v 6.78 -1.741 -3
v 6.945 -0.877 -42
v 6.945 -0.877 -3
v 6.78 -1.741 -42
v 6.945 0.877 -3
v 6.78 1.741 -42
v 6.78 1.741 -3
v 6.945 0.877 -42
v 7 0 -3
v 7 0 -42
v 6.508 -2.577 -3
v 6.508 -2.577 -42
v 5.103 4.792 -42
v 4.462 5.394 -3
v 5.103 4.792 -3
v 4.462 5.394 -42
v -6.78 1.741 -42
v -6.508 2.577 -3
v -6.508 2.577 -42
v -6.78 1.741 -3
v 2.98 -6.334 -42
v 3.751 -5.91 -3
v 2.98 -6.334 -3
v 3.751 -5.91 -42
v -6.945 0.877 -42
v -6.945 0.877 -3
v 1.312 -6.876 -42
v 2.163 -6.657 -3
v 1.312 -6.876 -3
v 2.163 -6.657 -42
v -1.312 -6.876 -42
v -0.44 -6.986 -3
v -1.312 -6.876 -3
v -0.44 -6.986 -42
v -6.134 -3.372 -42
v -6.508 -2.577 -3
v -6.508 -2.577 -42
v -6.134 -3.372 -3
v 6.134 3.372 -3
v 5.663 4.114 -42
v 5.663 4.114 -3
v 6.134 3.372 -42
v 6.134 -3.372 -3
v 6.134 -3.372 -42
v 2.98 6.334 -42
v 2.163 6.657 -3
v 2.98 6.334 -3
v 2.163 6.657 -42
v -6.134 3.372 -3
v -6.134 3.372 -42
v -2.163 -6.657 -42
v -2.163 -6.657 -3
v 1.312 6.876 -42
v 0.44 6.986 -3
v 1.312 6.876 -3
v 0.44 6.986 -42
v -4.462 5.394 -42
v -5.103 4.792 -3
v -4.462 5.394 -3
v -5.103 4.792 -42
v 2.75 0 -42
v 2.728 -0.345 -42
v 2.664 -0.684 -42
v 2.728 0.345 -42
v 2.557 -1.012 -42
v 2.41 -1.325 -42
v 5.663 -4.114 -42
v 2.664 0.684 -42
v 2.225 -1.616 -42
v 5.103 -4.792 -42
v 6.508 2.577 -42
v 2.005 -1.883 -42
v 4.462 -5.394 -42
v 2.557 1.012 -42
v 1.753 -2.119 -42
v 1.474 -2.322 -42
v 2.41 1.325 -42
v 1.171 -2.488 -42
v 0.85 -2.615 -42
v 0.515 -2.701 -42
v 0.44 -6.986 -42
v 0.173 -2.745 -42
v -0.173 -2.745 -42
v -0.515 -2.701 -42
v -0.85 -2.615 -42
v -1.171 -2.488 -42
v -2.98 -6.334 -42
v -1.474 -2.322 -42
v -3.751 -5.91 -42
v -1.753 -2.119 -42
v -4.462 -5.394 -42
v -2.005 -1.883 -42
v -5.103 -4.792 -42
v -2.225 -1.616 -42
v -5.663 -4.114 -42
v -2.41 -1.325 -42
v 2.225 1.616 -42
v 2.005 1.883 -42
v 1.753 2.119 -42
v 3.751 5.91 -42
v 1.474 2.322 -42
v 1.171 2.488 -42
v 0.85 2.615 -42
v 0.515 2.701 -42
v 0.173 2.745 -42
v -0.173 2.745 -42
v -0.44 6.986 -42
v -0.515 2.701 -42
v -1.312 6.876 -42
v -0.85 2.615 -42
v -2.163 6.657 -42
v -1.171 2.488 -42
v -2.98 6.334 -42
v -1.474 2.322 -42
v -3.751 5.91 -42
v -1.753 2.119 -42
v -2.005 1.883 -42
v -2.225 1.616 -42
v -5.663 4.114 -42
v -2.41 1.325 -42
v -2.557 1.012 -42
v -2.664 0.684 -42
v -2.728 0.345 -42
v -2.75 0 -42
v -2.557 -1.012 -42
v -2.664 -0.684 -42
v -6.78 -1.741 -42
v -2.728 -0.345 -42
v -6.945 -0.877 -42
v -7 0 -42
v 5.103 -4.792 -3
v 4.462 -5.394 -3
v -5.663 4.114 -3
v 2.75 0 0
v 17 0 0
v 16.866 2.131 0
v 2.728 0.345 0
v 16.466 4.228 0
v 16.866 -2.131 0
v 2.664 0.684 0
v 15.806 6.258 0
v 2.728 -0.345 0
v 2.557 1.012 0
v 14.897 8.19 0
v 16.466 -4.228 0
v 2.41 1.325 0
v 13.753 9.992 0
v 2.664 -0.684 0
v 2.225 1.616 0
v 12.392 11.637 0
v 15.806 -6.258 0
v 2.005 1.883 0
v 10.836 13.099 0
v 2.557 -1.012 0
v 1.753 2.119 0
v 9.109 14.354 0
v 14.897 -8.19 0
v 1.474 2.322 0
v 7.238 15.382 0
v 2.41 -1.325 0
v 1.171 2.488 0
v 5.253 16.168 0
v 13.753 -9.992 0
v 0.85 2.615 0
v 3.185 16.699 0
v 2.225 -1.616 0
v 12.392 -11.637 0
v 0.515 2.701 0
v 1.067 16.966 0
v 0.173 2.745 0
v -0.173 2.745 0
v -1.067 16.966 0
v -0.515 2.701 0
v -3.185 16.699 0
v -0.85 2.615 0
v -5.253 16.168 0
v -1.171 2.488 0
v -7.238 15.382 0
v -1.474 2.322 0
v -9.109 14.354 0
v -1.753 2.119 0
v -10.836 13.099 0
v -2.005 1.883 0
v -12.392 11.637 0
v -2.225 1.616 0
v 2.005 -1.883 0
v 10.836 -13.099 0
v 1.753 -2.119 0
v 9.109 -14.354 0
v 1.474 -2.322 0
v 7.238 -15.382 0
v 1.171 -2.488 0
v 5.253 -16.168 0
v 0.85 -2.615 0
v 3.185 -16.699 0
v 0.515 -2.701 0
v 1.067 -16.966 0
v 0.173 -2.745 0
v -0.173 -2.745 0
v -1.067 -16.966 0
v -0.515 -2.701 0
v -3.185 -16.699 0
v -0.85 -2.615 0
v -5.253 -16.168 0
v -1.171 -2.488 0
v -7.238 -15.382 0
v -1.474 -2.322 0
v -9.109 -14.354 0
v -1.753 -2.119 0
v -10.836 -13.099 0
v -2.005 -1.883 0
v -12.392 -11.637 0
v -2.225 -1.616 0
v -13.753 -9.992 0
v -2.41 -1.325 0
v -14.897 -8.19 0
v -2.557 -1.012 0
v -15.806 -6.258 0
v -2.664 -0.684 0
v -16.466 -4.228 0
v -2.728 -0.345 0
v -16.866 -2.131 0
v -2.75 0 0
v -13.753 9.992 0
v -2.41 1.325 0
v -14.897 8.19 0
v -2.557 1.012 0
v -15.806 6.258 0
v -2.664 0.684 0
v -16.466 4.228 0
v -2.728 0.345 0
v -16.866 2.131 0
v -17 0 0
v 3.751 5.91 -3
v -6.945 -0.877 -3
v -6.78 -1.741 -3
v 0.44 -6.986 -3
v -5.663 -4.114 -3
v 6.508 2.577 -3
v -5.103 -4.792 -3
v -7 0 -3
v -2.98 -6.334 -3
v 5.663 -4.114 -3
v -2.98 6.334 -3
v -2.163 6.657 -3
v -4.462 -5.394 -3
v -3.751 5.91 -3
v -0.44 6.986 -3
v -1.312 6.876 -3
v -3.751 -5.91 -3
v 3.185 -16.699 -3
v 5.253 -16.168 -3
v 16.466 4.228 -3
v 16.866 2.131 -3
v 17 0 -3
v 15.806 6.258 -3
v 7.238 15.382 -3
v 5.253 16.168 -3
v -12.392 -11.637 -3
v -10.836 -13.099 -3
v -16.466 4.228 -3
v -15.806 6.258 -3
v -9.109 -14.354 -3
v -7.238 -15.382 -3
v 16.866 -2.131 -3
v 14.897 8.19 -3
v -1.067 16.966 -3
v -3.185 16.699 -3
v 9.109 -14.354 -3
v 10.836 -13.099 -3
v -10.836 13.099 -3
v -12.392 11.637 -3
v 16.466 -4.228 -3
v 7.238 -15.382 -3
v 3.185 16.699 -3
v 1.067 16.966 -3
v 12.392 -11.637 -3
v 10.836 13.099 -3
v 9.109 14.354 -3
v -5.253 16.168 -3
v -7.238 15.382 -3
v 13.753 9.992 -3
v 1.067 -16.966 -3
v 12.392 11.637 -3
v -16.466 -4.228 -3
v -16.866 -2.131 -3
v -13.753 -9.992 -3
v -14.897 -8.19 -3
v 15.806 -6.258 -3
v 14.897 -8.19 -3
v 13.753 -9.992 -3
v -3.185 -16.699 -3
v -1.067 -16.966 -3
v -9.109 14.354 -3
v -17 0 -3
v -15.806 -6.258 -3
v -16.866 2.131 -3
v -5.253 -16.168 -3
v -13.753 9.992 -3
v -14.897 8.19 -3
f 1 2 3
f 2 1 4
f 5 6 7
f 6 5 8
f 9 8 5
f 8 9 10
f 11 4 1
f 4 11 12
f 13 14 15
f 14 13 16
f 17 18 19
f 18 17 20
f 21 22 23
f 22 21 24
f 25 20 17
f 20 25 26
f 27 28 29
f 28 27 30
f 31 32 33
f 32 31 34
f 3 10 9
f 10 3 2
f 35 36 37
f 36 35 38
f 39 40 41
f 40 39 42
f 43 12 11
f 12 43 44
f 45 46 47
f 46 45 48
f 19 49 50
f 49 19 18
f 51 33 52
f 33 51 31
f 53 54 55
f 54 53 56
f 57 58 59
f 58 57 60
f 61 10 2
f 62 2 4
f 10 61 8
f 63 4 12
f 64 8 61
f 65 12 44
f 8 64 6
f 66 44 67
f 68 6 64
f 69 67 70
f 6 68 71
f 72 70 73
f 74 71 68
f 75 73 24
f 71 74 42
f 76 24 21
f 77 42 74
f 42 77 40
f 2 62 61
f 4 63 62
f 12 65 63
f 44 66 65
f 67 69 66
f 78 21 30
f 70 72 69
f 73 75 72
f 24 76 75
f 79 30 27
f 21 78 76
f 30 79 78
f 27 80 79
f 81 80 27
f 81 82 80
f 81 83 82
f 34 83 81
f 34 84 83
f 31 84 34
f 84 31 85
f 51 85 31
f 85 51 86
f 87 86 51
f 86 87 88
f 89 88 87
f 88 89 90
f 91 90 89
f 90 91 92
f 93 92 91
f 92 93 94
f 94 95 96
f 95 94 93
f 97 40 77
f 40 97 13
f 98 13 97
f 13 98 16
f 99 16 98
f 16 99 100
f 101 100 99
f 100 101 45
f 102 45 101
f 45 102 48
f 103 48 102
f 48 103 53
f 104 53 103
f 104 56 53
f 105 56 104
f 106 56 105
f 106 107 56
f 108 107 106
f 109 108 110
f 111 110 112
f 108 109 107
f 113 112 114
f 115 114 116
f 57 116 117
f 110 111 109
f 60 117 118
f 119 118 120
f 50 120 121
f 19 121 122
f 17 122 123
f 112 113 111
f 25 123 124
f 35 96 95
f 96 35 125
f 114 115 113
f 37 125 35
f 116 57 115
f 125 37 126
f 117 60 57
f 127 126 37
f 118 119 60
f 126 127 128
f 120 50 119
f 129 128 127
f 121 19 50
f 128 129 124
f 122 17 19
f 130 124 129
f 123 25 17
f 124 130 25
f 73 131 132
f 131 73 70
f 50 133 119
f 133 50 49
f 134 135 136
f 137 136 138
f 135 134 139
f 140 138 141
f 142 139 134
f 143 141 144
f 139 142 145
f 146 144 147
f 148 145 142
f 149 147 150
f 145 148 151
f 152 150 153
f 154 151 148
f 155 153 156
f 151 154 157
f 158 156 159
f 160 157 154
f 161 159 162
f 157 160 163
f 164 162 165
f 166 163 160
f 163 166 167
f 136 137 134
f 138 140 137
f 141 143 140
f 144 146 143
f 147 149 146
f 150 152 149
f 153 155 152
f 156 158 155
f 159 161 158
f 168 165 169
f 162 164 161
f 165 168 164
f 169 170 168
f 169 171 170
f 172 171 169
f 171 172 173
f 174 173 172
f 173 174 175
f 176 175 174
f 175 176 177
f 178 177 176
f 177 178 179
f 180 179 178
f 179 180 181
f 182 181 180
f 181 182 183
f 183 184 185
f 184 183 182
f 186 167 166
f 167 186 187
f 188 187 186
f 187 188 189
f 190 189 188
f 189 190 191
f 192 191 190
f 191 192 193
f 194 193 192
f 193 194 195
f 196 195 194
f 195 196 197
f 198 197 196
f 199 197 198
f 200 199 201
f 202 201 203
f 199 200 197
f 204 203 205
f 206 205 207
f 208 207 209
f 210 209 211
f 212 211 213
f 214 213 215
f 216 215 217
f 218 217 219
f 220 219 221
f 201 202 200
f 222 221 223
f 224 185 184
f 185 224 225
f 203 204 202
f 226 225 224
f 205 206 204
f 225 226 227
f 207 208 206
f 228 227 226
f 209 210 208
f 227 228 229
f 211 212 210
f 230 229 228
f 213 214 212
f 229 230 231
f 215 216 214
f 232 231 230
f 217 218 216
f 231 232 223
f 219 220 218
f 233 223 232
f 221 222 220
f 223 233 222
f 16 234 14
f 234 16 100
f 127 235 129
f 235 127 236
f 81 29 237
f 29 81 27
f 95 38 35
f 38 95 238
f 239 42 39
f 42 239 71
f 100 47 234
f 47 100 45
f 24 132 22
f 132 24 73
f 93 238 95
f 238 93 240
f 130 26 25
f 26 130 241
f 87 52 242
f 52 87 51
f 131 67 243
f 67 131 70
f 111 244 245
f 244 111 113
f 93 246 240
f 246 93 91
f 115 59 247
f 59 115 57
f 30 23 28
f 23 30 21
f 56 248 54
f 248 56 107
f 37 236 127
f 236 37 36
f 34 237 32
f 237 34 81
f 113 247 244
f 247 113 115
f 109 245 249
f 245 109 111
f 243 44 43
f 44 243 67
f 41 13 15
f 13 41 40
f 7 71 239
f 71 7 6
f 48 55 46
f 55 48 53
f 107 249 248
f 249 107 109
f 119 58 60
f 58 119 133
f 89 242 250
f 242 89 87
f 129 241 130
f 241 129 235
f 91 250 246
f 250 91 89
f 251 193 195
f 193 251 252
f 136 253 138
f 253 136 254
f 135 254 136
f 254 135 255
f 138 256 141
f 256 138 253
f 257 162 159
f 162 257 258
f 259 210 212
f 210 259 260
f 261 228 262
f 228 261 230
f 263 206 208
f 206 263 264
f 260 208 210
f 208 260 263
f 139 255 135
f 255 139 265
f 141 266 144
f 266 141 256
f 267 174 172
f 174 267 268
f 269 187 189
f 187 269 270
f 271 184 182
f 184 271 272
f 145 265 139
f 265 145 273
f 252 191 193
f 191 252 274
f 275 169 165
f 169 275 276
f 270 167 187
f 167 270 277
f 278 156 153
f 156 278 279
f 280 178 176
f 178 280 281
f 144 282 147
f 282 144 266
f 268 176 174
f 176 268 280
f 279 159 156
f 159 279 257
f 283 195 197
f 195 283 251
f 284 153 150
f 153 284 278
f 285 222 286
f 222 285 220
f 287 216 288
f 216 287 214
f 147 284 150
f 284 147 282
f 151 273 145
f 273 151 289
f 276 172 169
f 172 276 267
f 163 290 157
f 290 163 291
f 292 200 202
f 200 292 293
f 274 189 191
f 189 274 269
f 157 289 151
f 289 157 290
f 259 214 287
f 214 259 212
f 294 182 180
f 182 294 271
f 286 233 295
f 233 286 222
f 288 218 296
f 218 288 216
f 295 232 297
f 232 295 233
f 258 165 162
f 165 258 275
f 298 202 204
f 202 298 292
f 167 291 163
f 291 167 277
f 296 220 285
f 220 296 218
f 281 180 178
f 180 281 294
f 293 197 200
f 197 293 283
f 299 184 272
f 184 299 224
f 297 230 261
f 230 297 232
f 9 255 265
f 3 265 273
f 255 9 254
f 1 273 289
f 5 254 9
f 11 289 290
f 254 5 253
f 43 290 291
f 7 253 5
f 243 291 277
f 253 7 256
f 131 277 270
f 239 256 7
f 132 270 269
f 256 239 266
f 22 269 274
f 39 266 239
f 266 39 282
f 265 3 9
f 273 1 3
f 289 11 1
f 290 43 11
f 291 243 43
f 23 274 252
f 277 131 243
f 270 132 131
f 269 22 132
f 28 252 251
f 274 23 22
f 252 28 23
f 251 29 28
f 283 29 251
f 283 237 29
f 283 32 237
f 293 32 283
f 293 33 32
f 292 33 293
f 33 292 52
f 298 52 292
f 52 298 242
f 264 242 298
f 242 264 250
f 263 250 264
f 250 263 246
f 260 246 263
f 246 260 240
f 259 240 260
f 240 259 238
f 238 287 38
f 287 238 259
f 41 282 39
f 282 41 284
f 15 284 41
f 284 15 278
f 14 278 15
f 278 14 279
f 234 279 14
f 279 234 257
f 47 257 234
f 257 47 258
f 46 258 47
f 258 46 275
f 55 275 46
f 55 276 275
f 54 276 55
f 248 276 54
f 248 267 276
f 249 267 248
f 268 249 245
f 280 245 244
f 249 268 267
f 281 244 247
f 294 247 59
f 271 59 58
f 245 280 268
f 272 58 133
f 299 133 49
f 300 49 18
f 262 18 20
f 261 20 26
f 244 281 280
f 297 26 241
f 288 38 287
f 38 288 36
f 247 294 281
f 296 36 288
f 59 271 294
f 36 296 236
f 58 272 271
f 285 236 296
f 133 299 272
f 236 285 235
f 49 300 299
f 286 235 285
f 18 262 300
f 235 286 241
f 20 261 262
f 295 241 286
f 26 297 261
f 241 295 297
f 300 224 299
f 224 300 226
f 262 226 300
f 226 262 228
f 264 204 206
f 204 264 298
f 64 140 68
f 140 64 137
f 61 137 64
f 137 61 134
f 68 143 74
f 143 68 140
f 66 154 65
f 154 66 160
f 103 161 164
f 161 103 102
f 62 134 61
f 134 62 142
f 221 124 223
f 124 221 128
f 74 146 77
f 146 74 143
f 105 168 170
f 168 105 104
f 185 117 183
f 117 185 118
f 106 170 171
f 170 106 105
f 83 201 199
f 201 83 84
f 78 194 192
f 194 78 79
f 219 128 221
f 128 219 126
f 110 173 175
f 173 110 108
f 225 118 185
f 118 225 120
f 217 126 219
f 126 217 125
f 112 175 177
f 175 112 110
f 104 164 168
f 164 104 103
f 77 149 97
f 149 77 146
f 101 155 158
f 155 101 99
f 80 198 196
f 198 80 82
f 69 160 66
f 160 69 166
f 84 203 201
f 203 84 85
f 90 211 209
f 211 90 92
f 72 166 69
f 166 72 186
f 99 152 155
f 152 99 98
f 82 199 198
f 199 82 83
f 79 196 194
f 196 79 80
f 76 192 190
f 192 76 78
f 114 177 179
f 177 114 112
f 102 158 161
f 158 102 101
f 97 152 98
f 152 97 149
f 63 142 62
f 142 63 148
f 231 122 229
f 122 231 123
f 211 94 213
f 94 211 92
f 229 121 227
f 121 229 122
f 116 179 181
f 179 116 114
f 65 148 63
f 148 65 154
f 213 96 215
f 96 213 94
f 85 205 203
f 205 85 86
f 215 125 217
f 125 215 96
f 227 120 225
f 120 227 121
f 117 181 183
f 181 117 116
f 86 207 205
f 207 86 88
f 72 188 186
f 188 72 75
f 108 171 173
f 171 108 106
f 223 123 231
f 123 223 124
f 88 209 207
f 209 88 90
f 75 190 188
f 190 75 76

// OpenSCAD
$fn = 50;


difference() {
	union() {
		translate(v = [0, 0, -42.0000000000]) {
			cylinder(h = 42, r = 7.0000000000);
		}
		translate(v = [0, 0, -3.0000000000]) {
			cylinder(h = 3, r = 17.0000000000);
		}
	}
	union() {
		#translate(v = [0, 0, -42]) {
			cylinder(h = 42, r = 2.7500000000);
		}
	}
}
